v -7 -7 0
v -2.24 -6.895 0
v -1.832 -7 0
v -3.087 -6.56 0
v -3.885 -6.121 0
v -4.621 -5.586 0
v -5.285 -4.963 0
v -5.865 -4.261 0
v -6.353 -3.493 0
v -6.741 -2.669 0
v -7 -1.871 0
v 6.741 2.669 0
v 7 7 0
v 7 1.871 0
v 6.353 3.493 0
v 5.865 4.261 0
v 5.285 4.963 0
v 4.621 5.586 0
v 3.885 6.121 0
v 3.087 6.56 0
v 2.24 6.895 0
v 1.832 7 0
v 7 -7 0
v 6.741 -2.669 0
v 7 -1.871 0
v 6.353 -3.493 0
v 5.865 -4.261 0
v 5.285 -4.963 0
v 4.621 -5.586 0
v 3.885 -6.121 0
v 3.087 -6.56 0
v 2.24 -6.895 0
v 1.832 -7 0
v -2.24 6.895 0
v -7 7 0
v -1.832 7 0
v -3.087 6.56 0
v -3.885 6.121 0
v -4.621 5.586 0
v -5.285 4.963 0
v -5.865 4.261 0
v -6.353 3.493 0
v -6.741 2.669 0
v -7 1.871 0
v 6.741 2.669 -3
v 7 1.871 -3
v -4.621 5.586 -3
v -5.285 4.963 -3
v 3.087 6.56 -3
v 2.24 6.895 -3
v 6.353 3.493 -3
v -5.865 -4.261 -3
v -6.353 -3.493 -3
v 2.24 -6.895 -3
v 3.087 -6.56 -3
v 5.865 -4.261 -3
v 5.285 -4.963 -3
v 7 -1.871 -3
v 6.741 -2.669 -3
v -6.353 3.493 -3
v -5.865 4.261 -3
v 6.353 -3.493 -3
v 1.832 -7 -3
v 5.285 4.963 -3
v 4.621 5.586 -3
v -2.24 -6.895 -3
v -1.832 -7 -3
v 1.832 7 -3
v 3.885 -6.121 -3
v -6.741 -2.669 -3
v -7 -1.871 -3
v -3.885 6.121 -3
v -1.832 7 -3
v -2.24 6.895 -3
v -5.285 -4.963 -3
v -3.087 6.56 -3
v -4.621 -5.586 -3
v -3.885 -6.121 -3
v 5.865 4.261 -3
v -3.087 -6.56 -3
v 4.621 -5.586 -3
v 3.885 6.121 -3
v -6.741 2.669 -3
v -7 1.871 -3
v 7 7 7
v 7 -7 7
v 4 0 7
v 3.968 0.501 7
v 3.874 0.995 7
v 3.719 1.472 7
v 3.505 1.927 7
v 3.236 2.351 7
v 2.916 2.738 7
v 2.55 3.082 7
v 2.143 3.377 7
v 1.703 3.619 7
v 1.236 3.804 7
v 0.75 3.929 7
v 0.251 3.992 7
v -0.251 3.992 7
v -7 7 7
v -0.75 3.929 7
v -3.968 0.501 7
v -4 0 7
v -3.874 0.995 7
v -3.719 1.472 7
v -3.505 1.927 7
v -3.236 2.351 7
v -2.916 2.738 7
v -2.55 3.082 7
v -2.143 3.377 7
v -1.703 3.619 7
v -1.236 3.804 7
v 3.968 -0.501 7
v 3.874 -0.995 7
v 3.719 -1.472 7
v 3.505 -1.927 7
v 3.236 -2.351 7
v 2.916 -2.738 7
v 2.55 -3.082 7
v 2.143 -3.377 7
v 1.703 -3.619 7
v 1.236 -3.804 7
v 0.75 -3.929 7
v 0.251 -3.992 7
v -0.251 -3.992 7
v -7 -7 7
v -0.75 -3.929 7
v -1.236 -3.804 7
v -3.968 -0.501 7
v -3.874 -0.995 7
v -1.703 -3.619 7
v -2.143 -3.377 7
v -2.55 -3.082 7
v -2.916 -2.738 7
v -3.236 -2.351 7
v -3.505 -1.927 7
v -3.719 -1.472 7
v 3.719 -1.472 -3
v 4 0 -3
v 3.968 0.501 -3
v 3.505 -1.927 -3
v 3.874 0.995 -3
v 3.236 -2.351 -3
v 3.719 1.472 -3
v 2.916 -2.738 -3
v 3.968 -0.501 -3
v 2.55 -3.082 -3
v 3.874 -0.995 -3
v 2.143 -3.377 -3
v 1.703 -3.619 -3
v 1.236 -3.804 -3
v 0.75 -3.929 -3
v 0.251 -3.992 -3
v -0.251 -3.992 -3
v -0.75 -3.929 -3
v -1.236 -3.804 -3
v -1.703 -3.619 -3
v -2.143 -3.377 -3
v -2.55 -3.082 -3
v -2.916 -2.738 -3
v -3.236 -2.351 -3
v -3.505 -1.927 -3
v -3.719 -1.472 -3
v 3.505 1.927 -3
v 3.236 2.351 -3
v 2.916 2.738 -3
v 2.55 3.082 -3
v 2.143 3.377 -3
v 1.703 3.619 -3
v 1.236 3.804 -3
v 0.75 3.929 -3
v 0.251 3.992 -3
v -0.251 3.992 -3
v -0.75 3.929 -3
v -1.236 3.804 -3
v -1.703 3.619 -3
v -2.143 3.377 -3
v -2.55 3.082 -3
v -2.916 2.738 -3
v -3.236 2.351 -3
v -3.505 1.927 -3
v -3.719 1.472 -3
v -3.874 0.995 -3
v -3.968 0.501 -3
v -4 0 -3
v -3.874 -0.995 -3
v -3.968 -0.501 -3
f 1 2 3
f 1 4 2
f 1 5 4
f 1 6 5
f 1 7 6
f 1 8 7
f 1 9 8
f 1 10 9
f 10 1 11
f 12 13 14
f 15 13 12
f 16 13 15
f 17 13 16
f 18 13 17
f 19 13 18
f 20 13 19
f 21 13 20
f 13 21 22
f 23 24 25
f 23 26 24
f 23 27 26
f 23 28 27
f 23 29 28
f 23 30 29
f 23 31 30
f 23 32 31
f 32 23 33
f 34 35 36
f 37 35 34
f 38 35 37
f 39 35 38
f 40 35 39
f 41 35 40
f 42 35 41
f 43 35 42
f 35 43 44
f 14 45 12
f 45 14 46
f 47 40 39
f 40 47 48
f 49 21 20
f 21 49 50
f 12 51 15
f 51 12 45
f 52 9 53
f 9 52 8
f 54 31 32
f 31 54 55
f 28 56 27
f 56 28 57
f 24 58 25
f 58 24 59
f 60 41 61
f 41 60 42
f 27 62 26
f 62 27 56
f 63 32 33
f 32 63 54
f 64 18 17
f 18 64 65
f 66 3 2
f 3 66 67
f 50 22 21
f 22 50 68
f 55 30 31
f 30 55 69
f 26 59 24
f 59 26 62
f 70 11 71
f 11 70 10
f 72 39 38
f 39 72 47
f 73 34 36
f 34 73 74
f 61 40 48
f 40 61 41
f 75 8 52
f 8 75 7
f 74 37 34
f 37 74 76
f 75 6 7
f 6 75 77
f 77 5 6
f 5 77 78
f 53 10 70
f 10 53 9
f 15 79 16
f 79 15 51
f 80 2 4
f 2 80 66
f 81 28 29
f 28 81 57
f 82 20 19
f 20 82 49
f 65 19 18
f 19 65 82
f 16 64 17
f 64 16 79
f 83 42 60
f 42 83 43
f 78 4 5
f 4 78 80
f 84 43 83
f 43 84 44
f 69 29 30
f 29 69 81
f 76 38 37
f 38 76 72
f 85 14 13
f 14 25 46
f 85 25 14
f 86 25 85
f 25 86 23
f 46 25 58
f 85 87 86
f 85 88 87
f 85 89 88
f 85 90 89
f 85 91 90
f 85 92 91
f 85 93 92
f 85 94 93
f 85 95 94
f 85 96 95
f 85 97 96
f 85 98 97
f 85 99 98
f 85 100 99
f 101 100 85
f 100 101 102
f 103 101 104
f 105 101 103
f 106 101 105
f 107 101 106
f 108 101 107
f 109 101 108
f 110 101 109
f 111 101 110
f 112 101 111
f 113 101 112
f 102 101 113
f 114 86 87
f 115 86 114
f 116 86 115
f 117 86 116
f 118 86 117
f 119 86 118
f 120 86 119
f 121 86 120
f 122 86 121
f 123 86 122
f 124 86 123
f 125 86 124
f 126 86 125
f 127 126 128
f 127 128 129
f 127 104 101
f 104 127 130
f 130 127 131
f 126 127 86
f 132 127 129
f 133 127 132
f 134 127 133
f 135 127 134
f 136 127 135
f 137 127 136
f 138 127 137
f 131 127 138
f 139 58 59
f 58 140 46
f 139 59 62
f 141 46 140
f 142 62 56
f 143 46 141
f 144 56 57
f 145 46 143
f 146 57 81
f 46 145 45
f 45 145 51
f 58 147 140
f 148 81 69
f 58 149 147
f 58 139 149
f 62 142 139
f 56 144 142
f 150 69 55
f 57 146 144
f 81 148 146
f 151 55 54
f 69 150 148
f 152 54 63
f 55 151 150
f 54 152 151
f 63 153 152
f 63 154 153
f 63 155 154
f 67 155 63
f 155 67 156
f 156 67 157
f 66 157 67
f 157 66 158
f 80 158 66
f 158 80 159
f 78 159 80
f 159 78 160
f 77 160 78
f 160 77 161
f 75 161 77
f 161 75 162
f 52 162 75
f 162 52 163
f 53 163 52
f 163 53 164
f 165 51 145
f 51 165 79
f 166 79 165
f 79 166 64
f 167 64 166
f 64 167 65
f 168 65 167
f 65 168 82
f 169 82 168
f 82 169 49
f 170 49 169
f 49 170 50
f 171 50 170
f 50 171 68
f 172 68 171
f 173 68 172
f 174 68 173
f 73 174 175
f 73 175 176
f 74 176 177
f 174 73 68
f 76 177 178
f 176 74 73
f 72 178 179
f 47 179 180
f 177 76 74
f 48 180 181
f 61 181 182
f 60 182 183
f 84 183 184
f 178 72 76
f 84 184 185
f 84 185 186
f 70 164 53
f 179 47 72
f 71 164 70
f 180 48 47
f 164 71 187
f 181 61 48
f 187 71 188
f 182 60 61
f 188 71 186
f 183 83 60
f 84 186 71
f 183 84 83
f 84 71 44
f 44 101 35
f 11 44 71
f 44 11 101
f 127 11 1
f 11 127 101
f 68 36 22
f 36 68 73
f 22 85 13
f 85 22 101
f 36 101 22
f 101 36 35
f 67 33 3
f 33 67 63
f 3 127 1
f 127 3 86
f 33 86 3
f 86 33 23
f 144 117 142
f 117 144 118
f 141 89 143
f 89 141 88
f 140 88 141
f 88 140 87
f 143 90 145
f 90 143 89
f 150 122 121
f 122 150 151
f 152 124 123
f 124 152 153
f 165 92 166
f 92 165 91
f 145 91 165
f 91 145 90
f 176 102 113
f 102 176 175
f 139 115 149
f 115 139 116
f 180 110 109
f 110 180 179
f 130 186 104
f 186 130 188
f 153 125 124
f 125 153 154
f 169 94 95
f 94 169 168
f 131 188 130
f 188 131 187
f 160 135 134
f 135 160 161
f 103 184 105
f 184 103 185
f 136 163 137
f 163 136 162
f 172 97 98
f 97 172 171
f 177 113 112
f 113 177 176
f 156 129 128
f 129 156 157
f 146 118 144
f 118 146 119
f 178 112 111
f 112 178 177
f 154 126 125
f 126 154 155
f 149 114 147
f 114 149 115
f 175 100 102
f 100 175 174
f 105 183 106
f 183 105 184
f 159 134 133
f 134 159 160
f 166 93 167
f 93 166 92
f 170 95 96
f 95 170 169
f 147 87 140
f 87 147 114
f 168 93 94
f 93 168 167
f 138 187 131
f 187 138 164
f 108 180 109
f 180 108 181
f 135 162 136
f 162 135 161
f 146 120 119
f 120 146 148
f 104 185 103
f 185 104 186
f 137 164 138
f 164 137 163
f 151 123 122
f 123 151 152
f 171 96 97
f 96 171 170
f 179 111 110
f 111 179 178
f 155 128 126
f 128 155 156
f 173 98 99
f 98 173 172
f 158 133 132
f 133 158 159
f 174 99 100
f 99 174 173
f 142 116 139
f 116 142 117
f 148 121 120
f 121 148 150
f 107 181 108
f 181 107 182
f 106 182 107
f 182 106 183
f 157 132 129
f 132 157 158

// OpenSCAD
$fn=50;
W = 14;
H = 7;
D = 8;

module washer(){
  difference(){
    cylinder(d=25.5, h=4);
    translate([0, 0, -1])cylinder(d=14.5, h=5);
  }
}

difference(){
  union(){
    translate([-W/2, -W/2, -3])cube([W, W, H + 3]);
  }
  translate([0, 0, -10])cylinder(h=100, d=D);
  translate([0, 0, -4])washer();
}
  
